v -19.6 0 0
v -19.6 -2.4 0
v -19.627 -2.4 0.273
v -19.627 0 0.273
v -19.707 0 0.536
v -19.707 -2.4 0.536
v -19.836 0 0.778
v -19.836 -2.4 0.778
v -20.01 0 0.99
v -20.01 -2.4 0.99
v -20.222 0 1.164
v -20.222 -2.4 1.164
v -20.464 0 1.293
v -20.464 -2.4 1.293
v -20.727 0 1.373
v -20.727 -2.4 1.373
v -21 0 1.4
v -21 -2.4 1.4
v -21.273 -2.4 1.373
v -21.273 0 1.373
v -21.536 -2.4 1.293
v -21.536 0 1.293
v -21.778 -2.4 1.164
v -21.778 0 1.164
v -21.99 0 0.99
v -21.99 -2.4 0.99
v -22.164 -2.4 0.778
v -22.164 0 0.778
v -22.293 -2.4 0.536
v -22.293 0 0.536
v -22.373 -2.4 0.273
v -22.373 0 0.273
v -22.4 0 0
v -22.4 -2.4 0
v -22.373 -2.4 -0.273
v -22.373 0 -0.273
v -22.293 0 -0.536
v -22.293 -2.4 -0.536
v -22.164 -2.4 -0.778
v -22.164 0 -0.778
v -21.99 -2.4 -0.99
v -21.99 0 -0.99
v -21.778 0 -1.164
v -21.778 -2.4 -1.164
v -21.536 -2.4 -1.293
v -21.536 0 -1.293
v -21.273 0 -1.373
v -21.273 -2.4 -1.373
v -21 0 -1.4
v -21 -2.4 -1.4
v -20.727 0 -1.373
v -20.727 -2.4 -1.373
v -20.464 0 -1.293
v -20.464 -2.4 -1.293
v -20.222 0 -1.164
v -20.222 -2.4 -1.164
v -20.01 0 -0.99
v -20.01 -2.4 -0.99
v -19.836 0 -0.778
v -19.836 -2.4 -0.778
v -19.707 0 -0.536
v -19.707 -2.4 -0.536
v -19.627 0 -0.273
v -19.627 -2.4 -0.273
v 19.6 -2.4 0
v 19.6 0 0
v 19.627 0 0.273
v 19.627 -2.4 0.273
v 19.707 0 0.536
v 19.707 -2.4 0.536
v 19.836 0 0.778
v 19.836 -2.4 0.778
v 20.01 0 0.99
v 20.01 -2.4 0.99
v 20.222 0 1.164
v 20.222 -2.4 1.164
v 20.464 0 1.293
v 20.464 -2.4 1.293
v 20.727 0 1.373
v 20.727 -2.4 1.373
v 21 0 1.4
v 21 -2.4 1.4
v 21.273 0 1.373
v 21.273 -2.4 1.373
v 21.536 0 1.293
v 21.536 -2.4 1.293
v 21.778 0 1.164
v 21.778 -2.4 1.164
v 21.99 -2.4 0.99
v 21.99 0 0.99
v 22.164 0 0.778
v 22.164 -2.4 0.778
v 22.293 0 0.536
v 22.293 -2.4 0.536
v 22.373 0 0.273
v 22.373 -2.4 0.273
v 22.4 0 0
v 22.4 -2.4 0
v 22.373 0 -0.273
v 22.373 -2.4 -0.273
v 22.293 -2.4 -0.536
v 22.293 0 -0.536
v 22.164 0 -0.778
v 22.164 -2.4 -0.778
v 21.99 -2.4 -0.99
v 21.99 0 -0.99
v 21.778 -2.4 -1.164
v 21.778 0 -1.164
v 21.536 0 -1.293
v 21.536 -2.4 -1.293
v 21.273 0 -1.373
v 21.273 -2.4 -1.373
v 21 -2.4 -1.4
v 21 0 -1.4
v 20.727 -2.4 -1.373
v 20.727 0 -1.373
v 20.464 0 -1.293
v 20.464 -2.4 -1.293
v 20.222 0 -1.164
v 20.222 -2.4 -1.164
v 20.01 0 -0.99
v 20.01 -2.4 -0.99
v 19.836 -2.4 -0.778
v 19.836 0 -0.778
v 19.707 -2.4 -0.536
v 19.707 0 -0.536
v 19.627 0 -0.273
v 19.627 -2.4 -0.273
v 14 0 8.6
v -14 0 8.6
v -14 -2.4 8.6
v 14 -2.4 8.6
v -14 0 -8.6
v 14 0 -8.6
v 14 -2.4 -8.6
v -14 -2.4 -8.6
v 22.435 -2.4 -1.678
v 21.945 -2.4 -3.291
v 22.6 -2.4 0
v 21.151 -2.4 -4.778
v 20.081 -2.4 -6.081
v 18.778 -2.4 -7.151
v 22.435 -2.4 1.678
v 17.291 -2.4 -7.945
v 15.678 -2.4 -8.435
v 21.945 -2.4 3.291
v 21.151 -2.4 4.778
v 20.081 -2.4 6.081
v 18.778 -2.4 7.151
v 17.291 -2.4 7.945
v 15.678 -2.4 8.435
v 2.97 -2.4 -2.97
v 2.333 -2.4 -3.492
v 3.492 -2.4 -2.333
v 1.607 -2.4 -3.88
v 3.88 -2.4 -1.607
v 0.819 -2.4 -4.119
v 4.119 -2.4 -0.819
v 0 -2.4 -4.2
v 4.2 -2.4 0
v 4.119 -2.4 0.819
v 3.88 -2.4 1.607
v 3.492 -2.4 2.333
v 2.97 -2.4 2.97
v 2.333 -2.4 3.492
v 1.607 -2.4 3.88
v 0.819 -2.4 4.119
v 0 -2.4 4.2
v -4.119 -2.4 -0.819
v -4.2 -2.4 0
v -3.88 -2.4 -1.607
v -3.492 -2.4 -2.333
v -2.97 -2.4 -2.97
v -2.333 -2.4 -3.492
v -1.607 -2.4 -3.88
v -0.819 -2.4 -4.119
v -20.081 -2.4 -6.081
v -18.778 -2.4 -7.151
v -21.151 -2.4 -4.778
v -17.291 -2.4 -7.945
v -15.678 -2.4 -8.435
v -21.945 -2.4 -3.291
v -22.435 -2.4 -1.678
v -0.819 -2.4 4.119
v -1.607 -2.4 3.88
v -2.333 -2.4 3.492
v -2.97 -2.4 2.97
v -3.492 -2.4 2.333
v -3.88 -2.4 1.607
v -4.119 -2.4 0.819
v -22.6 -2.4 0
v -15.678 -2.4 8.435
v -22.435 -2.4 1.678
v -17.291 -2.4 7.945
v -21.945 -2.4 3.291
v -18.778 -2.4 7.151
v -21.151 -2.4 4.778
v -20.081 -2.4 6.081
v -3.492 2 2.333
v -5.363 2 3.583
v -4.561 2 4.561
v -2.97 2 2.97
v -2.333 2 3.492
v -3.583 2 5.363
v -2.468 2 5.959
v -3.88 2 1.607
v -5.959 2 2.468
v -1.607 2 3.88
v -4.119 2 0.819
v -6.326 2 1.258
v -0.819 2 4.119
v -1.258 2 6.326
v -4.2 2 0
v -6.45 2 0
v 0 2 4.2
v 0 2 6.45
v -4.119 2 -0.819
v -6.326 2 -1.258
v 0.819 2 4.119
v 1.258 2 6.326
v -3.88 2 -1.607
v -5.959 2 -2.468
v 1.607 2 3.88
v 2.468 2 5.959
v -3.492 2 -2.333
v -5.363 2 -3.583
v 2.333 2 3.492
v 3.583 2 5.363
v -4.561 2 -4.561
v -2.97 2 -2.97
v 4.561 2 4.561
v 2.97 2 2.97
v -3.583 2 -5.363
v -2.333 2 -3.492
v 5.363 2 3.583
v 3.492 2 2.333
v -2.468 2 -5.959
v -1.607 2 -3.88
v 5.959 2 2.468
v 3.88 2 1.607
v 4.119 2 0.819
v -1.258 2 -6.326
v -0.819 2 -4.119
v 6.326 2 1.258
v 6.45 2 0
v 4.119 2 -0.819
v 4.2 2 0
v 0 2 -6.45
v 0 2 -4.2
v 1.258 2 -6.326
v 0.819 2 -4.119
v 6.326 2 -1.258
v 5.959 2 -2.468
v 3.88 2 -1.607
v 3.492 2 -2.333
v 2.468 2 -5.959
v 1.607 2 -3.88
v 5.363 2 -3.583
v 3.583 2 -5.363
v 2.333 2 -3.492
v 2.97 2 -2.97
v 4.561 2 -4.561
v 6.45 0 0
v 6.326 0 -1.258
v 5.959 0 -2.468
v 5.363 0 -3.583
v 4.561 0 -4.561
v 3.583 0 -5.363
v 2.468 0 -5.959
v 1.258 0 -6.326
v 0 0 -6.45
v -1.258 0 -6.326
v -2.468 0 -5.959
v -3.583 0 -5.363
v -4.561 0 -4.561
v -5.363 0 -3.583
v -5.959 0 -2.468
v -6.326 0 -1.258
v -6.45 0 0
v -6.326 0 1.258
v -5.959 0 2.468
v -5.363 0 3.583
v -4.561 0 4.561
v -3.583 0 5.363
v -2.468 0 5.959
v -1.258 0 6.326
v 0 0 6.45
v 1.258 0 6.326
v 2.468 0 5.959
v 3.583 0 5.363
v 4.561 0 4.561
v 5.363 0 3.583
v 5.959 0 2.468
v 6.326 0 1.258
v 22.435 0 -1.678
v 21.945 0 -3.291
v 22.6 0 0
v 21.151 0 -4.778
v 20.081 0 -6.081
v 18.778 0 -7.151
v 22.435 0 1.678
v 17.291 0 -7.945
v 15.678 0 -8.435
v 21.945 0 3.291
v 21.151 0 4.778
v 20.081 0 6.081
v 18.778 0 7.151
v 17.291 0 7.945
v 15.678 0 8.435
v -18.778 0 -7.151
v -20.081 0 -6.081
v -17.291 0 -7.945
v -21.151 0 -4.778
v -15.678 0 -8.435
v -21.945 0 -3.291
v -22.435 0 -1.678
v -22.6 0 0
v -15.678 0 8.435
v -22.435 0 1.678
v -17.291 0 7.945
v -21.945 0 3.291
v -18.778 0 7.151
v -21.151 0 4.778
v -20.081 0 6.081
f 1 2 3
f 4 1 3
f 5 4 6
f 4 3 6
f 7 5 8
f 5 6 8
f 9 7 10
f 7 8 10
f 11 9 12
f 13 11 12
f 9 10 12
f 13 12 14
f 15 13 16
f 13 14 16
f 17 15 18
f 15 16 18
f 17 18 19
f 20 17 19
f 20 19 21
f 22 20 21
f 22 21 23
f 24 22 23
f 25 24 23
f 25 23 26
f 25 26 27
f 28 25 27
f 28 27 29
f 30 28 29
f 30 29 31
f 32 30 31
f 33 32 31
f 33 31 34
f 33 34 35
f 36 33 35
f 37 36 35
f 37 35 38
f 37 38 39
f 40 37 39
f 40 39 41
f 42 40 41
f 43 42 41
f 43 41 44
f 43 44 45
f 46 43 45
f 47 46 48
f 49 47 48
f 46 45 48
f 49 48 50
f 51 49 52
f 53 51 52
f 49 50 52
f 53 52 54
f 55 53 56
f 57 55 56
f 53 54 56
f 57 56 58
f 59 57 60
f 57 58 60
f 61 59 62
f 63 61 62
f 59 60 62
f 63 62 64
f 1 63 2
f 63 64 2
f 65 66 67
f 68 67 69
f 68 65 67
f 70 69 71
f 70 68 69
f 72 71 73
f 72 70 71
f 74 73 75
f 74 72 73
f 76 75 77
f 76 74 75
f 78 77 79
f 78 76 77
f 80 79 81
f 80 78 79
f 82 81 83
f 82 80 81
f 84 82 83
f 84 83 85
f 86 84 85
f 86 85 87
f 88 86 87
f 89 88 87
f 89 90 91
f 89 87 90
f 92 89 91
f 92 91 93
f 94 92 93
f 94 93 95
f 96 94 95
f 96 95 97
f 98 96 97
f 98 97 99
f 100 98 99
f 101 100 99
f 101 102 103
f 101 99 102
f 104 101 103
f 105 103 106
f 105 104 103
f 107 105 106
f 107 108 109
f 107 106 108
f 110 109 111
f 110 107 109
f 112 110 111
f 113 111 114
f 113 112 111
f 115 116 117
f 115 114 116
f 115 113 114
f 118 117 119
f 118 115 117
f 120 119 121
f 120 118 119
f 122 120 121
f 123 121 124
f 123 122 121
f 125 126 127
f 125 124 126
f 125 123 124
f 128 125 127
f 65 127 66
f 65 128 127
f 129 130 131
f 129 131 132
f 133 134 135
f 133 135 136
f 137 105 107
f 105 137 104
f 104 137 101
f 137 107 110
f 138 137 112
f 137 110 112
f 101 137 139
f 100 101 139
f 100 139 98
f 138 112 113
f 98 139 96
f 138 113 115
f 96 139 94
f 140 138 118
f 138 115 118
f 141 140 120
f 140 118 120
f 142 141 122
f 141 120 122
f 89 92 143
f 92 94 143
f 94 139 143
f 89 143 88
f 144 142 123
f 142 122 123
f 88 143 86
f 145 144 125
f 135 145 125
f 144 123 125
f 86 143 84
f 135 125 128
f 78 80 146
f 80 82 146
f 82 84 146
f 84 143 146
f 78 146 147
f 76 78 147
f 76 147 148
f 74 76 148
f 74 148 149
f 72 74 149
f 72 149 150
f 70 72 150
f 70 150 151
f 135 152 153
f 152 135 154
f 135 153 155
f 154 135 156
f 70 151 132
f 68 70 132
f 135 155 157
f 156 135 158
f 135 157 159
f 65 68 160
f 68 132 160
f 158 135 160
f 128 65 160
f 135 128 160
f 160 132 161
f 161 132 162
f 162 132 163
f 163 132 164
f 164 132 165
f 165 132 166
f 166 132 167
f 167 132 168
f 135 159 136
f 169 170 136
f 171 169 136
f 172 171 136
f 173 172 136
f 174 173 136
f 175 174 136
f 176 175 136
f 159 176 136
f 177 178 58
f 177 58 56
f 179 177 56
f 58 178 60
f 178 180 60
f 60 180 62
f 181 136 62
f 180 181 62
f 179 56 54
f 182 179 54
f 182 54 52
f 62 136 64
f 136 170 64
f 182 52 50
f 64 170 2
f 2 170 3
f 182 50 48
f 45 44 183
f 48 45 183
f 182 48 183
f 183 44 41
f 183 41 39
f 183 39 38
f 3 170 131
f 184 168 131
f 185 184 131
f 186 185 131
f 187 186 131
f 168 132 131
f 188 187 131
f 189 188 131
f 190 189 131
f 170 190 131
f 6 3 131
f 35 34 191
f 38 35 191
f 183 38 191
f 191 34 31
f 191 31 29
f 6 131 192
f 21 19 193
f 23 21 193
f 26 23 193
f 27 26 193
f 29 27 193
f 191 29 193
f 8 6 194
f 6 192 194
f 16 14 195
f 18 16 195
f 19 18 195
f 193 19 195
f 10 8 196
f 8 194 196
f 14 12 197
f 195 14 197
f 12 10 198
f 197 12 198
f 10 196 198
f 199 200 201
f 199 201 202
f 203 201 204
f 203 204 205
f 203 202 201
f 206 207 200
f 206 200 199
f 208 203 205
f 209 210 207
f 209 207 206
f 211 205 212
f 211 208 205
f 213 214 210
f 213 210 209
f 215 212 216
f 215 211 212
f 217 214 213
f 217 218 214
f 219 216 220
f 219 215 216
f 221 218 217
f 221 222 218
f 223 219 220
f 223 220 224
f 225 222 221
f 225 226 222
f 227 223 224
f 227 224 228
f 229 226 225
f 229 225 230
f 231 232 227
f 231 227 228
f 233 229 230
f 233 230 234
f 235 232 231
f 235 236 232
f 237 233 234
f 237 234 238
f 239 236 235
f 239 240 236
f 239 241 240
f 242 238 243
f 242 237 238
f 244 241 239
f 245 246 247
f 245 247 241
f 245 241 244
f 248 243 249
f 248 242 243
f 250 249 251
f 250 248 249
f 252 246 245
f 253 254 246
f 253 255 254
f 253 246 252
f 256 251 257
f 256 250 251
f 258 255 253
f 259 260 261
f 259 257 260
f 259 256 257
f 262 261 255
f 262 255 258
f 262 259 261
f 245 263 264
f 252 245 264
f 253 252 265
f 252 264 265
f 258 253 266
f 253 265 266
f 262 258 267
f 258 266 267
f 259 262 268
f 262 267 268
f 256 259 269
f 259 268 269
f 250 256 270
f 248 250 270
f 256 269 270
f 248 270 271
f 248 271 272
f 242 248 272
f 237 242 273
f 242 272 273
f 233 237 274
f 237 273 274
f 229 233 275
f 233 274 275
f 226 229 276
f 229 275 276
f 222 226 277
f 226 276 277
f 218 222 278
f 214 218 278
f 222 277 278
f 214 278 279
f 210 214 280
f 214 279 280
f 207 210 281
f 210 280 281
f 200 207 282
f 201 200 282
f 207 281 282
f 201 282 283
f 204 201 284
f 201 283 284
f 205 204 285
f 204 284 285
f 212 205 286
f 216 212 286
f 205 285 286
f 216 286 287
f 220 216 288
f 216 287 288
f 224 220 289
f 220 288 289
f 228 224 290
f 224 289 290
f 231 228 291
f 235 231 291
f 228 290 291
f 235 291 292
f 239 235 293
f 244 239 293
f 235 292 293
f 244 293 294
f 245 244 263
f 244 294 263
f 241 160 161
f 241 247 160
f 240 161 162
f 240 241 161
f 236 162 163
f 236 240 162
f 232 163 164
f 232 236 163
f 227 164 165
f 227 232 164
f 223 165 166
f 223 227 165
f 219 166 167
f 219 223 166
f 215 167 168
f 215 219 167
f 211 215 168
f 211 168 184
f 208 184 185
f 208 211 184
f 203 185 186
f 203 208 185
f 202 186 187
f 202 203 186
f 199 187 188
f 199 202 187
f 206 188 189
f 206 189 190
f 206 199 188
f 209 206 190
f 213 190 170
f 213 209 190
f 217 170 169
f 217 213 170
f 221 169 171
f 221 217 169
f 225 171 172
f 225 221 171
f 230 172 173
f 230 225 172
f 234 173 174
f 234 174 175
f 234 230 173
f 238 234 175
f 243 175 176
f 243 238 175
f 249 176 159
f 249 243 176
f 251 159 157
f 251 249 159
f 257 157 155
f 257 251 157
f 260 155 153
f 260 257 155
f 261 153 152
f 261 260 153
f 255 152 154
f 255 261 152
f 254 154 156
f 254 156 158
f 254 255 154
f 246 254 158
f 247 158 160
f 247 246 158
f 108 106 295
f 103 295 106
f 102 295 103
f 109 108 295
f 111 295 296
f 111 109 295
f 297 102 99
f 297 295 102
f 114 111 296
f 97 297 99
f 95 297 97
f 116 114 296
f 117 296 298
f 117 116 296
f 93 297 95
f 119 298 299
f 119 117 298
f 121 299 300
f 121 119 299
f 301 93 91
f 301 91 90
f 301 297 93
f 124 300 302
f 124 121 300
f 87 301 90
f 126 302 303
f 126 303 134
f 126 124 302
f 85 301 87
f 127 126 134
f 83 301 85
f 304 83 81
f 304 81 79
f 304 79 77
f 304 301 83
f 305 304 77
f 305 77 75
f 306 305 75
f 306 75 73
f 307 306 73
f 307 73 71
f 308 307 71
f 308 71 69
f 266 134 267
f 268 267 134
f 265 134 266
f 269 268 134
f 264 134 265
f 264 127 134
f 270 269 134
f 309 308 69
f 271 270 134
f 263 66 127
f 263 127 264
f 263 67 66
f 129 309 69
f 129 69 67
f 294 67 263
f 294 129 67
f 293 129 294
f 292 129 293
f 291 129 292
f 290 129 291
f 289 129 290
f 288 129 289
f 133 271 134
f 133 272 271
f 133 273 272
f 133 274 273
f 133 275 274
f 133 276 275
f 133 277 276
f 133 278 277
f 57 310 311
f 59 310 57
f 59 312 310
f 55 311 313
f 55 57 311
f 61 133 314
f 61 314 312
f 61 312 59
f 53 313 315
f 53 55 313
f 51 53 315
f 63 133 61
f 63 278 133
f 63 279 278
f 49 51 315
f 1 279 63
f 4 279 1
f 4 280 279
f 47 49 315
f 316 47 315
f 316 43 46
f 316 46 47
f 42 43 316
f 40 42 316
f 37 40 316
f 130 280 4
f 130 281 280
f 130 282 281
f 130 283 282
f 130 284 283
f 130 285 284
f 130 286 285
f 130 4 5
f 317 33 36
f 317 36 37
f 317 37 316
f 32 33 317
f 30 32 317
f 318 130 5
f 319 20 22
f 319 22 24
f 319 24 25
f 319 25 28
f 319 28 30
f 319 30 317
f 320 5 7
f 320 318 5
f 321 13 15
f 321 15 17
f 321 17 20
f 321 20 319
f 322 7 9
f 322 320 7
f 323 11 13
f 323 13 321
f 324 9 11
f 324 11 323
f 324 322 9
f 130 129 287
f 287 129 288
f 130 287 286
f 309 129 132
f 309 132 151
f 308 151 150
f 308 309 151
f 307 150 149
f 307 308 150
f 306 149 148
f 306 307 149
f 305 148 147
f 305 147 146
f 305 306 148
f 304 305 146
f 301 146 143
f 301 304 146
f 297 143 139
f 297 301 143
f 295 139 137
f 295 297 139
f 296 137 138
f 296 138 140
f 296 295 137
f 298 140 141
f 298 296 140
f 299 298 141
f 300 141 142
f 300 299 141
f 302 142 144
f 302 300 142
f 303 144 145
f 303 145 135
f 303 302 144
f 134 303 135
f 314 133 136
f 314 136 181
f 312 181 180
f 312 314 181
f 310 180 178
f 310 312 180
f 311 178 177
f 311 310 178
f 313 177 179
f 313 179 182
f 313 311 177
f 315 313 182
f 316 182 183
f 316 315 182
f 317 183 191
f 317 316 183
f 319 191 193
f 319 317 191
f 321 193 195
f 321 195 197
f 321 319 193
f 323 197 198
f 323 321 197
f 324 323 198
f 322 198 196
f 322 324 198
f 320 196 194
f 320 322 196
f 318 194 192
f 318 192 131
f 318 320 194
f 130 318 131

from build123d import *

# Parameters (mm, degrees)
SKETCH_1_R          = 6.45
SKETCH_1_R_2        = 4.2
EXTRUDE_1_DEPTH     = 2
SKETCH_2_R          = 4.2
EXTRUDE_3_DEPTH     = 2.4
SKETCH_3_R          = 1.4
CUT_EXTRUDE_1_DEPTH = 10


with BuildPart() as part:
    # 스케치1 → 보스-돌출1 (new body)
    with BuildSketch(Plane(origin=(0, 0, 0), x_dir=(1, 0, 0), z_dir=(0, 1, 0))):
        Circle(SKETCH_1_R)
        Circle(SKETCH_1_R_2, mode=Mode.SUBTRACT)
    extrude(amount=EXTRUDE_1_DEPTH)

    # 스케치2 → 보스-돌출3 (add)
    with BuildSketch(Plane.XZ):
        with BuildLine():
            Line((-14, 8.6), (14, 8.6))
            ThreePointArc((14, 8.6), (22.6, 0), (14, -8.6))
            Line((14, -8.6), (-14, -8.6))
            ThreePointArc((-14, -8.6), (-22.6, 0), (-14, 8.6))
        make_face()
        Circle(SKETCH_2_R, mode=Mode.SUBTRACT)
    extrude(amount=EXTRUDE_3_DEPTH)

    # 스케치3 → 컷-돌출1 (cut)
    with BuildSketch(Plane.XZ.offset(2.4)):
        with Locations((-21, 0)):
            Circle(SKETCH_3_R)
    cut_extrude_1 = extrude(amount=-CUT_EXTRUDE_1_DEPTH, mode=Mode.SUBTRACT)

    # 대칭 복사1: 컷-돌출1 across plane
    add(cut_extrude_1.mirror(Plane(origin=(0, 0, 0), x_dir=(0, 0, 1), z_dir=(1, 0, 0))), mode=Mode.SUBTRACT)


solid = part.part
